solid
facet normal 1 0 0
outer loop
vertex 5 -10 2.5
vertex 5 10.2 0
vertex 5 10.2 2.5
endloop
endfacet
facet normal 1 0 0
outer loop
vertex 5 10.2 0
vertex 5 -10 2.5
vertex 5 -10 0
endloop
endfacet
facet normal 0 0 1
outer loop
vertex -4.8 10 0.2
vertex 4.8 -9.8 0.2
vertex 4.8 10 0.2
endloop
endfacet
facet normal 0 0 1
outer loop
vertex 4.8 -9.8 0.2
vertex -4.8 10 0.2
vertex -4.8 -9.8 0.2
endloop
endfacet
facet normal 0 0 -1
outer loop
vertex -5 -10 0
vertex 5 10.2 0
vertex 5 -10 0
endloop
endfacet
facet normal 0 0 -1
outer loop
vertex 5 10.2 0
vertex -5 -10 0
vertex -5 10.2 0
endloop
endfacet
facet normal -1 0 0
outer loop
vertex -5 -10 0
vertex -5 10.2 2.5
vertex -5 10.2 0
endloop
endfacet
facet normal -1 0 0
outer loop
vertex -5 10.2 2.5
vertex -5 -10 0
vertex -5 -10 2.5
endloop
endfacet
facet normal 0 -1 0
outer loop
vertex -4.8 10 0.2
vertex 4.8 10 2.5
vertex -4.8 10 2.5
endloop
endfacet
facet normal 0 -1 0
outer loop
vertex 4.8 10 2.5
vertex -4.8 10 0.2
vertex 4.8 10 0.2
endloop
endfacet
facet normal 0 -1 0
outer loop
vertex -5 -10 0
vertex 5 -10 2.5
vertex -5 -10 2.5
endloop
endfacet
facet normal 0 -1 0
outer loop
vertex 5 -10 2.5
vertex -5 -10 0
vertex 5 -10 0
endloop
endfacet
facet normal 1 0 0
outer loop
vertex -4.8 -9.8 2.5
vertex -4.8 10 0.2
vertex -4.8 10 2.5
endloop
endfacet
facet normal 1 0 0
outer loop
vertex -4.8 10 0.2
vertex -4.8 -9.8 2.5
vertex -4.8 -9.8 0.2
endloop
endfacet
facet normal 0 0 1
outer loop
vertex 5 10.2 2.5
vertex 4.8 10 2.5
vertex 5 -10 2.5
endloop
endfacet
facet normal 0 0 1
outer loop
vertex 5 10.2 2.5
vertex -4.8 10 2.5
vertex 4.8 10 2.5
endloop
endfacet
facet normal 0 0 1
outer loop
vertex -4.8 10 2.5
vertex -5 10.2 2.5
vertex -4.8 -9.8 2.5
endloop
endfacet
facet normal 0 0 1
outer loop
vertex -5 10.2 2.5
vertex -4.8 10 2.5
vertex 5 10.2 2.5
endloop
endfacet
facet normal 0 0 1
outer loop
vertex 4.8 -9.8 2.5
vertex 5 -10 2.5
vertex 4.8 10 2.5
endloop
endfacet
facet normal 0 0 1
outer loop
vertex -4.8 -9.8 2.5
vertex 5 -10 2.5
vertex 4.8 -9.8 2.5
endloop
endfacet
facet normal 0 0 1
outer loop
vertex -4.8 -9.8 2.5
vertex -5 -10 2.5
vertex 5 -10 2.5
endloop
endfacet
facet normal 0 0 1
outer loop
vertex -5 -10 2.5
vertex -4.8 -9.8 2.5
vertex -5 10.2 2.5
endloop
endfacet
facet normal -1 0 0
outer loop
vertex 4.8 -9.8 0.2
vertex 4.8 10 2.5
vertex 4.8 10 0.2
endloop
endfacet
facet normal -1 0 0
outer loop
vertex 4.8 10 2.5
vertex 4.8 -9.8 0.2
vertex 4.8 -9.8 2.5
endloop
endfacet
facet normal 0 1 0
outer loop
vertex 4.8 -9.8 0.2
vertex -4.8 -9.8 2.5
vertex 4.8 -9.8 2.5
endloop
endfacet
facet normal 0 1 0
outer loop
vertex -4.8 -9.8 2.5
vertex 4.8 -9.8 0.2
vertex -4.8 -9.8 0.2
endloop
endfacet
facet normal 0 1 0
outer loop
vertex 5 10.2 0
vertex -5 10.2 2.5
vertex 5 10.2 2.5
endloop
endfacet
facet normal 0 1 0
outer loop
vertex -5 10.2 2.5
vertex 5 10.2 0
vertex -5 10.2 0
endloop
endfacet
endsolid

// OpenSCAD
translate([-5, -10, 0])
{
cube([10,20,0.2]);
cube([0.2, 20, 2.5]);
translate([10-0.2, 0, 0])
    cube([0.2, 20, 2.5]);
cube([10, 0.2, 2.5]);
translate([0, 20, 0])
cube([10, 0.2, 2.5]);  
}
